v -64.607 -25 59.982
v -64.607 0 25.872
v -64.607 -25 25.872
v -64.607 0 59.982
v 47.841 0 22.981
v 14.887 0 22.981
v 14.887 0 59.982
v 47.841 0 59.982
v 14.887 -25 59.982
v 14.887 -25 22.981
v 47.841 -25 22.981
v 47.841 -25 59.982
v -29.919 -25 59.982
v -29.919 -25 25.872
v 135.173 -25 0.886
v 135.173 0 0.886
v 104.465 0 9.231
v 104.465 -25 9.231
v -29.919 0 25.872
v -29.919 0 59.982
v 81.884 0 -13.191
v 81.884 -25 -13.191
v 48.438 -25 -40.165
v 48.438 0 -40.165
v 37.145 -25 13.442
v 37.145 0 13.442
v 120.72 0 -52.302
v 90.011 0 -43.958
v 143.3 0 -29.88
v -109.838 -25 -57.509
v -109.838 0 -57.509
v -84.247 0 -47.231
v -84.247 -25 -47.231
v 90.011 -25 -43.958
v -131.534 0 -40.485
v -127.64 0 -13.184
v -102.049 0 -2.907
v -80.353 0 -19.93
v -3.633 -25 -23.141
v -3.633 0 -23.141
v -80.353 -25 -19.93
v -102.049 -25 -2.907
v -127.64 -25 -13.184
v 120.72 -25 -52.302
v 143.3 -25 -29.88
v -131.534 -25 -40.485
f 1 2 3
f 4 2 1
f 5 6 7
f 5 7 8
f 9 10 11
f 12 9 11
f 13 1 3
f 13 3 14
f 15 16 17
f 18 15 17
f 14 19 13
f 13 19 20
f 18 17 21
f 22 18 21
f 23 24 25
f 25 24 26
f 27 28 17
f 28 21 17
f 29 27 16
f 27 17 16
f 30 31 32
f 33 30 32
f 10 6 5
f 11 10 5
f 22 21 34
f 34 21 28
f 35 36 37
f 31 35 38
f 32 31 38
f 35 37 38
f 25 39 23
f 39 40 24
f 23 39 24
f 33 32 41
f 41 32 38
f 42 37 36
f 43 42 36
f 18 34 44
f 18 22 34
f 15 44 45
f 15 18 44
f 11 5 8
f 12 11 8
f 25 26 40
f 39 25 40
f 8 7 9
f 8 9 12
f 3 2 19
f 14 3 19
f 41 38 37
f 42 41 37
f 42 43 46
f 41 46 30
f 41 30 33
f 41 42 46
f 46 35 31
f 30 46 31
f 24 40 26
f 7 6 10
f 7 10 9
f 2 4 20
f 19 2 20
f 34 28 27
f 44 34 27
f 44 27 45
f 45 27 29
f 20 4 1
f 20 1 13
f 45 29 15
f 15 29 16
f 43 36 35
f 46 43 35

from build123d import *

# Parameters (mm, degrees)
F0_W     = 34.688168
F0_H     = 34.110039
F0_W_2   = 32.953782
F0_H_2   = 37.000716
F1_DEPTH = 25
F3_DEPTH = 25
F5_DEPTH = 25


with BuildPart() as f1:
    # F0 (on Front) → F1 (new body)
    with BuildSketch(Plane.XZ):
        with Locations((-47.26265, 42.92662)):
            Rectangle(F0_W, F0_H)
        with Locations((31.36389, 41.481279)):
            Rectangle(F0_W_2, F0_H_2)
    extrude(amount=F1_DEPTH)


with BuildPart() as f3:
    # F2 (on Front) → F3 (new body)
    with BuildSketch(Plane.XZ):
        Polygon((-131.53404, -40.485474), (-109.837874, -57.508622), (-84.247312, -47.230765), (-80.352917, -19.92976), (-102.049083, -2.906612), (-127.639645, -13.184469), align=None)
    extrude(amount=F3_DEPTH)


with BuildPart() as f5:
    # F4 (on Front) → F5 (new body)
    with BuildSketch(Plane.XZ):
        Polygon((-3.632625, -23.141384), (48.438166, -40.16453), (37.145248, 13.441671), align=None)
        Polygon((90.011122, -43.957501), (120.719535, -52.302182), (143.300448, -29.880256), (135.172946, 0.886351), (104.464533, 9.231031), (81.88362, -13.190895), align=None)
    extrude(amount=F5_DEPTH)


solid = Compound([f1.part, f3.part, f5.part])
